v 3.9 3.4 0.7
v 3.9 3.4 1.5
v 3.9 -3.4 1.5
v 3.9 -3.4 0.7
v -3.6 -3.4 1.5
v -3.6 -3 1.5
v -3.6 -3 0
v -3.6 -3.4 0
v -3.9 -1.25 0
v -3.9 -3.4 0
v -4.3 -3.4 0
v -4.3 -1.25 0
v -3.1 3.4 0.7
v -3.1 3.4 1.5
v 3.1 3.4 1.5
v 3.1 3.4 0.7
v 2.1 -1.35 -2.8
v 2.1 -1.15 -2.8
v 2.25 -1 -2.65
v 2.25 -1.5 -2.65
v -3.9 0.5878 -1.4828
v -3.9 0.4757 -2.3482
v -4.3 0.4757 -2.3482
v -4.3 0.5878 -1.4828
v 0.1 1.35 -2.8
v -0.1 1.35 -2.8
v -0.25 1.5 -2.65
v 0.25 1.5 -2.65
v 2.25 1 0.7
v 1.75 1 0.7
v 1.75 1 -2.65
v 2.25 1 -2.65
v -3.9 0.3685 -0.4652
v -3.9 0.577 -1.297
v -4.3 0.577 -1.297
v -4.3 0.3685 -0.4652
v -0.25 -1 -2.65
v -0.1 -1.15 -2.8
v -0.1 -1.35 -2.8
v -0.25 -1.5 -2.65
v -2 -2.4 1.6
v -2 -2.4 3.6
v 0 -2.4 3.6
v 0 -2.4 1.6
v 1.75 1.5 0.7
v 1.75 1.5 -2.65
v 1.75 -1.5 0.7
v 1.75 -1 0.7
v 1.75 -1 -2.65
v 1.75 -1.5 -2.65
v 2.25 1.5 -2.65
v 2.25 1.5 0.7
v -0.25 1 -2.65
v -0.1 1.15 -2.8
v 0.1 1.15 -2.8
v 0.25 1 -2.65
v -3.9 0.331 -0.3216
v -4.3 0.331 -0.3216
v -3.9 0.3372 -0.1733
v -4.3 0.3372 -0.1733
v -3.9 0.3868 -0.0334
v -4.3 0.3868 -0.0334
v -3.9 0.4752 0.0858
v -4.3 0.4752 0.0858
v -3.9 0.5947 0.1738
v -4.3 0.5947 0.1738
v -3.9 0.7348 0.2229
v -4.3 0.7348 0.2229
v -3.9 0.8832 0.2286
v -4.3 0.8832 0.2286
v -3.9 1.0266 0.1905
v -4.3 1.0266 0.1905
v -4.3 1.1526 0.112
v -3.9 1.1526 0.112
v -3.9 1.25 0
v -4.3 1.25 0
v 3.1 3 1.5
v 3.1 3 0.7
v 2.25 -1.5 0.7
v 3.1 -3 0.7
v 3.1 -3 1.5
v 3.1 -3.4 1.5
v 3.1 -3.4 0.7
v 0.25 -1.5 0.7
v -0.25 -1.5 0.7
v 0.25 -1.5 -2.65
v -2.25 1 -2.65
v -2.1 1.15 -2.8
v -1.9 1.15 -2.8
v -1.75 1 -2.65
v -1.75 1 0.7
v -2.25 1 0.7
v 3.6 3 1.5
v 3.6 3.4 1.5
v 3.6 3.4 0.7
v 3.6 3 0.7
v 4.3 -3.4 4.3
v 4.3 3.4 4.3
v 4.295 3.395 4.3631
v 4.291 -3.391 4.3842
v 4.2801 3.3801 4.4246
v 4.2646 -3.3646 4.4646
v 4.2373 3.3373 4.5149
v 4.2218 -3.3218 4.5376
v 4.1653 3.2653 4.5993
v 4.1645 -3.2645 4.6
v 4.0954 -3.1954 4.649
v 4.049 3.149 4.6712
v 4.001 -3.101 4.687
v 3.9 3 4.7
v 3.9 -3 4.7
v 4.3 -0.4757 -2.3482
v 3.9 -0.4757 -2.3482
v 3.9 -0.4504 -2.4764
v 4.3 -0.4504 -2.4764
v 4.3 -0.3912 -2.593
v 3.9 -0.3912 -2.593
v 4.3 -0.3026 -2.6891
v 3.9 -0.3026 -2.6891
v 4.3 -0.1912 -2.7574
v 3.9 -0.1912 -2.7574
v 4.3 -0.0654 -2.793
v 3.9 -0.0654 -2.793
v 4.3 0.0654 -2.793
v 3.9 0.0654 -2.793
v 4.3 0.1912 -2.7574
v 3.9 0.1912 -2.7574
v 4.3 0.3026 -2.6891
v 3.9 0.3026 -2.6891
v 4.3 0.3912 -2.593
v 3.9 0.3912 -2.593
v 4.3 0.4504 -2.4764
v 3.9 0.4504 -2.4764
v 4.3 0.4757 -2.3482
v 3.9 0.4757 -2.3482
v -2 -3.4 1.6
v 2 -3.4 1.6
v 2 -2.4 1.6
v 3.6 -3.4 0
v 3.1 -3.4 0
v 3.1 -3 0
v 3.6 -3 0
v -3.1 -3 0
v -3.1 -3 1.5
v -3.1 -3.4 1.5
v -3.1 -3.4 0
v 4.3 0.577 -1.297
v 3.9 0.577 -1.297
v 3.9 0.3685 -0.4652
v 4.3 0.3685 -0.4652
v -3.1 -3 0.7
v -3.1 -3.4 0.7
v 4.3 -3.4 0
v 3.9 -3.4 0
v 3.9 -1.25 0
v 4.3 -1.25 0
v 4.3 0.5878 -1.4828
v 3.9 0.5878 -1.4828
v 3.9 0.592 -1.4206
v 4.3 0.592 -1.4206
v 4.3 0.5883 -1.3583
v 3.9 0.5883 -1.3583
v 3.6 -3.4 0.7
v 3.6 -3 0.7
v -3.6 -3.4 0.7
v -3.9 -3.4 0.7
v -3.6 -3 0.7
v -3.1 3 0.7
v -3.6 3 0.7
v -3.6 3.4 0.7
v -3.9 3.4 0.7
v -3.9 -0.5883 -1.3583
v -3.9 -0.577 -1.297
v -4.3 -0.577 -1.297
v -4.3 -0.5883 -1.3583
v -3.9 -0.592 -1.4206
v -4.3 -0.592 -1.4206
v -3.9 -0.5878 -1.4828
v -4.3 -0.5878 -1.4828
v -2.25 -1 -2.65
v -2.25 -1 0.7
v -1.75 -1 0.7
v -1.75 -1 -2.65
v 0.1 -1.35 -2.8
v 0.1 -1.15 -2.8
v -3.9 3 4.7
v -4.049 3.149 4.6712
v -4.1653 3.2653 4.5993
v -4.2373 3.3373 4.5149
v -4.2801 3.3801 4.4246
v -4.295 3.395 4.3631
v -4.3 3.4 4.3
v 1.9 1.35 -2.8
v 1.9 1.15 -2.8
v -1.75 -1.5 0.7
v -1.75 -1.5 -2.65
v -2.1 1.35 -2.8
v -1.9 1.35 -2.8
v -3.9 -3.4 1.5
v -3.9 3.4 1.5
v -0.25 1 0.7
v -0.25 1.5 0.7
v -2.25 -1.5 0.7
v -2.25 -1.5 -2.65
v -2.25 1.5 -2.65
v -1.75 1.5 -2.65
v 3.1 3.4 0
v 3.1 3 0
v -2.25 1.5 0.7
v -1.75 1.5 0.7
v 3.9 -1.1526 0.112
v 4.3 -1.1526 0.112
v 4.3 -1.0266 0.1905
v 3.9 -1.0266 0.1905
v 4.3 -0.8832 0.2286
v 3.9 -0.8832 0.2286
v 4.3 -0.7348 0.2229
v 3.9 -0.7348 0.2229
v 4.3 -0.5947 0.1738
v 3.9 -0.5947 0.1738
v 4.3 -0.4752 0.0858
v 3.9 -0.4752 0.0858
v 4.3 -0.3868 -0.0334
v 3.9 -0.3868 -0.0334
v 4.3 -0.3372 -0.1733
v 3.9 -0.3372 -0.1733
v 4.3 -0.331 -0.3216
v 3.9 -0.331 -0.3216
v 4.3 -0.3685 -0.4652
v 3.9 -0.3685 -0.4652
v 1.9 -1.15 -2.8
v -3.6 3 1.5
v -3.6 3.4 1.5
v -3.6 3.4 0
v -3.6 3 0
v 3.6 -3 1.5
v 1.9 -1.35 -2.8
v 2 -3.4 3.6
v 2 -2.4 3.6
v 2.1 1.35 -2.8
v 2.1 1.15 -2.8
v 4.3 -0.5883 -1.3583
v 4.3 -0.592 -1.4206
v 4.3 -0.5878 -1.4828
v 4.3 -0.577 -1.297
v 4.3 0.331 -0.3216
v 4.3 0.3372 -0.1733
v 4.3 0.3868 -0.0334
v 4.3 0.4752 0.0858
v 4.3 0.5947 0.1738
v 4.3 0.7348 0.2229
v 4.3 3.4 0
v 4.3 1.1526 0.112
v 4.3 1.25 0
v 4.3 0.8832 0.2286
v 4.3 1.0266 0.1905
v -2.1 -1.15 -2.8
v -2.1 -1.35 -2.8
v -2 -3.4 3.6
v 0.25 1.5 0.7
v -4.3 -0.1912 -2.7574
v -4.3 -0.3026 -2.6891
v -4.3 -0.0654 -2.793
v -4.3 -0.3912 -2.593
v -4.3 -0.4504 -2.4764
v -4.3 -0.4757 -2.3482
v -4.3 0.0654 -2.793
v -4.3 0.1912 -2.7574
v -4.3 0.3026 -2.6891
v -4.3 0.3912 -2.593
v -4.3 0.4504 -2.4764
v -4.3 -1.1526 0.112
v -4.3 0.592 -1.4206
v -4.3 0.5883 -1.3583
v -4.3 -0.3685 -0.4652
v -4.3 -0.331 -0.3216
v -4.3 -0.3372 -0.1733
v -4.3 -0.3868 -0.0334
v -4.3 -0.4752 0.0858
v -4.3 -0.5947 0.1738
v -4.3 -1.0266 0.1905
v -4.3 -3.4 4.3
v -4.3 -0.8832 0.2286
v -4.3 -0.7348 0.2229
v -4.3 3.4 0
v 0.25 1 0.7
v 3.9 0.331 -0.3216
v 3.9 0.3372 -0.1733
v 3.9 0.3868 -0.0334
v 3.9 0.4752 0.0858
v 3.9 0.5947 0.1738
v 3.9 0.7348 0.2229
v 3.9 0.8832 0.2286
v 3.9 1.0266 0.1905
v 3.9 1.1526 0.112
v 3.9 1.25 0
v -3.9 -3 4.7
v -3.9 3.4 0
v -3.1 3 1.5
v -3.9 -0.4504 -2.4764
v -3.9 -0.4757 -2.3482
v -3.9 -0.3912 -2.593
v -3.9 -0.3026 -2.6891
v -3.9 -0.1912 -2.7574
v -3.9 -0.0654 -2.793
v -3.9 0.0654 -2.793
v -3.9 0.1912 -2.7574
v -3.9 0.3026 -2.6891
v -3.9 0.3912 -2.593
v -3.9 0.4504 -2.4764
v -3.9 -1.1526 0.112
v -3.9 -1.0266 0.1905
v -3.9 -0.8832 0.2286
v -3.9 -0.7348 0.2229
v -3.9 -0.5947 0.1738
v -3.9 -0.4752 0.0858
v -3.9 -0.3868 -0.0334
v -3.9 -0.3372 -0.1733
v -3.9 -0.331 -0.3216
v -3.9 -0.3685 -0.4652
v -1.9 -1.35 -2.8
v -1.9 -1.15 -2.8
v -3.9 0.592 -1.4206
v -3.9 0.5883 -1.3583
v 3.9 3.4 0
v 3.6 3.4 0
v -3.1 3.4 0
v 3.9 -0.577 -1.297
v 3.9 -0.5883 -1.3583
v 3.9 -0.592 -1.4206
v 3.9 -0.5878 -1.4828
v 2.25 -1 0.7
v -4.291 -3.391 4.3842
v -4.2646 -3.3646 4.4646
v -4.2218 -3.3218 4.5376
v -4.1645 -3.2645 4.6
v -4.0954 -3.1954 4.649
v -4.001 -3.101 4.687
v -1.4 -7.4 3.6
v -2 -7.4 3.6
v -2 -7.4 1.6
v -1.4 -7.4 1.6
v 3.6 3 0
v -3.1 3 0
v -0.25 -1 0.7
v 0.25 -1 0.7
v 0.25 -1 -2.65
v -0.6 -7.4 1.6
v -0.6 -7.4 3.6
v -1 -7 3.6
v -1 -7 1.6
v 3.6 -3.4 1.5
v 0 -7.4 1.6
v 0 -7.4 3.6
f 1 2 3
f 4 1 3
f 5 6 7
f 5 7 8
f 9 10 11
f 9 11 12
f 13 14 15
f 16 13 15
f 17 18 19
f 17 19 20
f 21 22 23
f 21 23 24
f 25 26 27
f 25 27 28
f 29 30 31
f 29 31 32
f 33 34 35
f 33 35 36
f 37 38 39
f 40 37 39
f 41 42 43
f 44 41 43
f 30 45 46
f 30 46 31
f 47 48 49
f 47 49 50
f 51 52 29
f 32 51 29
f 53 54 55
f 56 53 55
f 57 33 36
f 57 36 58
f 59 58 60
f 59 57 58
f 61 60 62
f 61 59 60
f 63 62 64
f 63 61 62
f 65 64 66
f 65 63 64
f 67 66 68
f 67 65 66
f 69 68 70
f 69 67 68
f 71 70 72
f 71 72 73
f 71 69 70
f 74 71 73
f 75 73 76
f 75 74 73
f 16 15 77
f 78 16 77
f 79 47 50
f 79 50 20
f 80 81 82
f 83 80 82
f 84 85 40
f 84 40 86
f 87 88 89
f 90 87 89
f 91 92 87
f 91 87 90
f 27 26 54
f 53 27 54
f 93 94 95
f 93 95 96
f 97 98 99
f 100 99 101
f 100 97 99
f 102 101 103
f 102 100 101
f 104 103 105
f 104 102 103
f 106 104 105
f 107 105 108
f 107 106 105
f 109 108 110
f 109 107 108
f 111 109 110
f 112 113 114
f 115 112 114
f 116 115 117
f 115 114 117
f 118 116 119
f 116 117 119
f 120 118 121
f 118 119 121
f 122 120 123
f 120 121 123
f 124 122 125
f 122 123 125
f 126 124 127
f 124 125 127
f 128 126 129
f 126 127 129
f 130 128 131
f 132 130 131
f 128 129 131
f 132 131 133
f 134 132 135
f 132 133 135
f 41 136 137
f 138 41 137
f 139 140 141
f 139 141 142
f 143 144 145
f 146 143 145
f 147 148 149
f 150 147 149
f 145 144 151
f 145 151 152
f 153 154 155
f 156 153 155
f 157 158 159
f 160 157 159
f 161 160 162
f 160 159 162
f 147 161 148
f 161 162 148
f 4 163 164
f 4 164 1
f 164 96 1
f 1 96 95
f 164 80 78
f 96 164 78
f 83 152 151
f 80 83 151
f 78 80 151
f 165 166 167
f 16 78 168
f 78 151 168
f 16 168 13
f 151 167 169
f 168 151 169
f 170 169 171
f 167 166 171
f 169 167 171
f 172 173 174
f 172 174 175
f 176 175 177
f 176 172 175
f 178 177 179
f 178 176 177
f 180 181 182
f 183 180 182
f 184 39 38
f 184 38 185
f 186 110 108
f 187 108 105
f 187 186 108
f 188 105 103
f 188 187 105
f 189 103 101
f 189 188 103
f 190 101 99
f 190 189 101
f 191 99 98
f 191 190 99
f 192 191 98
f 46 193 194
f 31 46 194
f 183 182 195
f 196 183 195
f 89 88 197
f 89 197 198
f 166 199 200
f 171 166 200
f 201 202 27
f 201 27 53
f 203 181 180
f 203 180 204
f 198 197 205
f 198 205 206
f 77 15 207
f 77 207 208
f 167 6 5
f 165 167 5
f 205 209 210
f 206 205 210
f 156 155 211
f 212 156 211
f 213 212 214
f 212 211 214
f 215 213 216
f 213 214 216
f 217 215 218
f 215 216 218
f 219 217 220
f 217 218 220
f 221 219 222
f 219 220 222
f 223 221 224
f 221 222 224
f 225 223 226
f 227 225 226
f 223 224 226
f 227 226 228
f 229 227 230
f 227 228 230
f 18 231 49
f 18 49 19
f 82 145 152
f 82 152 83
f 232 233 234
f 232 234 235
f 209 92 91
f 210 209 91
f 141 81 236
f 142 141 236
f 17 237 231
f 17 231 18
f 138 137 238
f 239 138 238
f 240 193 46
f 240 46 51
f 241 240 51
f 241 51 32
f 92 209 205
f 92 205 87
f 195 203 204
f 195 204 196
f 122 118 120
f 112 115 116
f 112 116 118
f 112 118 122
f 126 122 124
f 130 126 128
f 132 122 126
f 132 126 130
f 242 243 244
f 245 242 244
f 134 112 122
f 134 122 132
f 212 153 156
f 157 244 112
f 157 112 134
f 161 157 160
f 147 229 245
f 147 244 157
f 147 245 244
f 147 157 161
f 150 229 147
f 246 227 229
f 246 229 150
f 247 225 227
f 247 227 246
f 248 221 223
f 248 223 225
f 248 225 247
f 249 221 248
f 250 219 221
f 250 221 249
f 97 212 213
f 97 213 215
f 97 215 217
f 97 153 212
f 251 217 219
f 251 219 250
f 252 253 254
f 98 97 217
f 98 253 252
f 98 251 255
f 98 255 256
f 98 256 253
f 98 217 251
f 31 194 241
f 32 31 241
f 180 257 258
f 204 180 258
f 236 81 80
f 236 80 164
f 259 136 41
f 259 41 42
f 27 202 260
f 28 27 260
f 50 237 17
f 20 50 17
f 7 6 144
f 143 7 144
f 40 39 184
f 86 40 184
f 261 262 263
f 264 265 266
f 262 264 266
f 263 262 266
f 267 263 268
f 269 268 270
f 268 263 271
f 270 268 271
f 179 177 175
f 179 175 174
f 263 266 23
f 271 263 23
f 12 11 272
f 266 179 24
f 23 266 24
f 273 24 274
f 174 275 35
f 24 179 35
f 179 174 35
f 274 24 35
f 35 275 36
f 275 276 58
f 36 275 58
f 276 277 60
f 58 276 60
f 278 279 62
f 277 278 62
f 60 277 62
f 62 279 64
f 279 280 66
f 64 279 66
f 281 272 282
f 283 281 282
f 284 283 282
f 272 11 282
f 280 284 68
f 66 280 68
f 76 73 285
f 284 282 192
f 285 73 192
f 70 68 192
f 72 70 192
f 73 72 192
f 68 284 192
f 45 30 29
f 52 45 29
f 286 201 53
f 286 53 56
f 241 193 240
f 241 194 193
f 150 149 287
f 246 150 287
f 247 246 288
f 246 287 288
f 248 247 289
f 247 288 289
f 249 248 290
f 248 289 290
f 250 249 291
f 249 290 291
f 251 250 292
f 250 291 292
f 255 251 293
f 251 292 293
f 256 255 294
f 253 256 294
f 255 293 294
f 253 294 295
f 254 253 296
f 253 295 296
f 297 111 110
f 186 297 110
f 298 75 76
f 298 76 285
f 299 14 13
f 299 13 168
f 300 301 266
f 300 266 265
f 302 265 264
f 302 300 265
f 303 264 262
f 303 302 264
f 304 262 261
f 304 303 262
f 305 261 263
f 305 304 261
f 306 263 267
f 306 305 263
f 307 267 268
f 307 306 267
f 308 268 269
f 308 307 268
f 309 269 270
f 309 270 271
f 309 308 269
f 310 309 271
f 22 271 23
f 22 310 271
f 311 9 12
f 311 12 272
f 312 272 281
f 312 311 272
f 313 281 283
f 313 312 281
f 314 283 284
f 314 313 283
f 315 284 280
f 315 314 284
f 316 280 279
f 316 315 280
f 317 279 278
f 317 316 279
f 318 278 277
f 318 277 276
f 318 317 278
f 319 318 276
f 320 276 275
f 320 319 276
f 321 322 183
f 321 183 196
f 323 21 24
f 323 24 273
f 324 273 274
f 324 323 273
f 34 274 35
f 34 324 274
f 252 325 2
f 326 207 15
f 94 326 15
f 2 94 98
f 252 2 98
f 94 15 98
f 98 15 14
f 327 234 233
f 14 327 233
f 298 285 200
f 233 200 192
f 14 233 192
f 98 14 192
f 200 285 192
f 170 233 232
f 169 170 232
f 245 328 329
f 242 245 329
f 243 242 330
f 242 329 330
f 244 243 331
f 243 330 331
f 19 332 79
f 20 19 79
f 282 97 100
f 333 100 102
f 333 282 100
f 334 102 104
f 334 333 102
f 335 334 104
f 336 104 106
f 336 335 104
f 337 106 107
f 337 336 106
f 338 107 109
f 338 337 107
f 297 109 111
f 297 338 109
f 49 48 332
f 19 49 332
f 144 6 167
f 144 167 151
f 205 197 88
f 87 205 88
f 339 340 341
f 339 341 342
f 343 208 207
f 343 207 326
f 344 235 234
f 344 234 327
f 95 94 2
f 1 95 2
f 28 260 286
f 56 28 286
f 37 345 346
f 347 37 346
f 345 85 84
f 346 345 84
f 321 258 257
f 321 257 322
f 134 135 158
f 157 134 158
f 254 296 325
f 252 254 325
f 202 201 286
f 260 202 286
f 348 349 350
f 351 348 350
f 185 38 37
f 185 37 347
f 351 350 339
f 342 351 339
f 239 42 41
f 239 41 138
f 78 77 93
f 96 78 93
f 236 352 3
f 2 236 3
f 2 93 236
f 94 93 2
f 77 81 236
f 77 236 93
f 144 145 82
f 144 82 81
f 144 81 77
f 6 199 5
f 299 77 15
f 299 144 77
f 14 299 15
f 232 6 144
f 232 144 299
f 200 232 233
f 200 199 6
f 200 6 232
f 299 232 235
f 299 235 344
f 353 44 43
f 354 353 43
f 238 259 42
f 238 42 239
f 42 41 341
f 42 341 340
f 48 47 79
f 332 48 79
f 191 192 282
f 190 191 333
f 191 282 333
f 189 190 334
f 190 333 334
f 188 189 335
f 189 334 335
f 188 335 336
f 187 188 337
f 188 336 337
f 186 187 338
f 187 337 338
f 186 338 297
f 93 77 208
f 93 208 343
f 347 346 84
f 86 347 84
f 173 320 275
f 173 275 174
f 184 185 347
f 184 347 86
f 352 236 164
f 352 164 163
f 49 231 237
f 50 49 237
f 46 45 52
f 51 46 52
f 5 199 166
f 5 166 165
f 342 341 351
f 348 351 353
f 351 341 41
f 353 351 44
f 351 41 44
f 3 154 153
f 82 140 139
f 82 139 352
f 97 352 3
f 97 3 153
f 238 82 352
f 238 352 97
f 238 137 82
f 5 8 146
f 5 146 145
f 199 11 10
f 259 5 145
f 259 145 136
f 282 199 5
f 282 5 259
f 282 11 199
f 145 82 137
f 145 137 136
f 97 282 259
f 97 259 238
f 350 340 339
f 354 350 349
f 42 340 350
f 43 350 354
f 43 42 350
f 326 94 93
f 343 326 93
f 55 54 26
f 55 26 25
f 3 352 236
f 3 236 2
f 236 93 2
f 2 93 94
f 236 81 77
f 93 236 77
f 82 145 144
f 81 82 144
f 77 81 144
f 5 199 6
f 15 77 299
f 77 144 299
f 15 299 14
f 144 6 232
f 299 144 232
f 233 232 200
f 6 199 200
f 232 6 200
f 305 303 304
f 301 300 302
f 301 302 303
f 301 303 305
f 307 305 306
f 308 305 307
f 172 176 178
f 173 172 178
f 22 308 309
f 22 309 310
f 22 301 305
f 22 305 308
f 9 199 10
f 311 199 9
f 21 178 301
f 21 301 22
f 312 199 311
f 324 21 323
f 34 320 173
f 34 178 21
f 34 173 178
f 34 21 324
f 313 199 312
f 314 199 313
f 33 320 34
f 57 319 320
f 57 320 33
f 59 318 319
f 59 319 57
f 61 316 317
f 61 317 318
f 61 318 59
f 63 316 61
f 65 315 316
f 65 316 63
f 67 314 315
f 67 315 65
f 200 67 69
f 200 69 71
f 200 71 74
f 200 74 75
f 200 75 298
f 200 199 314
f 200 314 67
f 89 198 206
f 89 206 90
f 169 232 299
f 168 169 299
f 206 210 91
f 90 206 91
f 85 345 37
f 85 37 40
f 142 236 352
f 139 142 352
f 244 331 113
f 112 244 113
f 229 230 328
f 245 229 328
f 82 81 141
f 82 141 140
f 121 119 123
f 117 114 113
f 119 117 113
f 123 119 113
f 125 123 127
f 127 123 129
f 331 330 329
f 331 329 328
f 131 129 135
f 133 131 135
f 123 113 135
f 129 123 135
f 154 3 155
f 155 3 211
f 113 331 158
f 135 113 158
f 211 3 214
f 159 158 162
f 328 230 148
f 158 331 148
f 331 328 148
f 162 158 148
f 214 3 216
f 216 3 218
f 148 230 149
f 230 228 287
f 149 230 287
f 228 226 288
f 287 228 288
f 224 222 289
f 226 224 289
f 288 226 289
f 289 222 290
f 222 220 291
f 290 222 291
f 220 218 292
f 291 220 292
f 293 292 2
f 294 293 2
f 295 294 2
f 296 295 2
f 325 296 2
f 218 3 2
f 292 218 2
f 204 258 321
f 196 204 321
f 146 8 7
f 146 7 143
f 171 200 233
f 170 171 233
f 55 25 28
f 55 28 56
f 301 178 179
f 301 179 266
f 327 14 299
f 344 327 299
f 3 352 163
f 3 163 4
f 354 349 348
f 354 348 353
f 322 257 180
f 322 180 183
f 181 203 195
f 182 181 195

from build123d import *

# Parameters (mm, degrees)
F1_START   = 3.9
F1_DEPTH   = 0.4
F3_W       = 6.8
F3_H       = 3.2
F4_DEPTH   = 8
F5_W       = 0.5
F5_H       = 0.4
F6_DEPTH   = 1.5
F7_DEPTH   = 0.8
F8_R       = 0.4
F9_W       = 4
F9_H       = 2
F10_DEPTH  = 1
F11_W      = 2
F11_H      = 2
F12_DEPTH  = 5
F14_DEPTH  = 25
F15_W      = 0.5
F15_H      = 0.5
F16_DEPTH  = 3.5
F17_SIZE   = 0.15
F17_2_SIZE = 0.15
F17_3_SIZE = 0.15
F17_4_SIZE = 0.15
F17_5_SIZE = 0.15
F17_6_SIZE = 0.15


with BuildPart() as f1:
    # F0 (on Right) → F1 (new body)
    with BuildSketch(Plane.YZ.offset(F1_START)):
        with BuildLine():
            Line((-3.4, 4.7), (-3.4, 0))
            Line((-3.4, 0), (-1.25, 0))
            ThreePointArc((-1.25, 0), (-0.5947362498, 0.1738282345), (-0.3685141855, -0.4652417265))
            Line((-0.3685141855, -0.4652417265), (-0.5769748612, -1.297007943))
            ThreePointArc((-0.5769748612, -1.297007943), (-0.5911237195, -1.3893977424), (-0.5878301918, -1.4828066172))
            Line((-0.5878301918, -1.4828066172), (-0.4757099377, -2.3481589742))
            ThreePointArc((-0.4757099377, -2.3481589742), (0, -2.7974626246), (0.4757099377, -2.3481589742))
            Line((0.4757099377, -2.3481589742), (0.5878301918, -1.4828066172))
            ThreePointArc((0.5878301918, -1.4828066172), (0.5911237195, -1.3893977424), (0.5769748612, -1.297007943))
            Line((0.5769748612, -1.297007943), (0.3685141855, -0.4652417265))
            ThreePointArc((0.3685141855, -0.4652417265), (0.5947362498, 0.1738282345), (1.25, 0))
            Line((1.25, 0), (3.4, 0))
            Line((3.4, 0), (3.4, 4.7))
            Line((3.4, 4.7), (-3.4, 4.7))
        make_face()
    extrude(amount=F1_DEPTH)


with BuildPart() as f2_1:
    # F2: instance of F1
    add(f1.part.mirror(Plane.YZ))


with BuildPart() as f1_1:
    add(f1.part)

    add(f2_1.part)  # F4 merges F2_1
    # F3 (on face) → F4 (join)
    with BuildSketch(Plane.YZ.offset(-3.9)):
        with Locations((0, 3.1)):
            Rectangle(F3_W, F3_H)
    extrude(amount=F4_DEPTH)

    # F5 (on face) → F6 (join)
    with BuildSketch(Plane(origin=(0, 0, 1.5), x_dir=(1, 0, 0), z_dir=(0, 0, -1))):
        with Locations((3.35, 3.2)):
            Rectangle(F5_W, F5_H)
        with Locations((3.35, -3.2)):
            Rectangle(F5_W, F5_H)
        with Locations((-3.35, 3.2)):
            Rectangle(F5_W, F5_H)
        with Locations((-3.35, -3.2)):
            Rectangle(F5_W, F5_H)
    extrude(amount=F6_DEPTH)


with BuildPart() as f7:
    # F7 (new): a face of the model
    f7_faces = [f1_1.part.faces().sort_by_distance(p)[0] for p in [
        (0, 0, 1.5),
    ]]
    extrude(f7_faces, amount=F7_DEPTH)


with BuildPart() as f1_2:
    add(f1_1.part)

    # F8
    f8_edges = [f1_2.edges().sort_by_distance(p)[0] for p in [
        (0, 3.4, 4.7),
        (-4.3, 0, 4.7),
        (0, -3.4, 4.7),
        (4.3, 0, 4.7),
    ]]
    fillet(f8_edges, radius=F8_R)

    # F9 (on face) → F10 (cut)
    with BuildSketch(Plane.XZ.offset(3.4)):
        with Locations((0, 2.6)):
            Rectangle(F9_W, F9_H)
    extrude(amount=-F10_DEPTH, mode=Mode.SUBTRACT)


with BuildPart() as f12:
    # F11 (on face) → F12 (new body)
    with BuildSketch(Plane.XZ.offset(2.4)):
        with Locations((-1, 2.6)):
            Rectangle(F11_W, F11_H)
    extrude(amount=F12_DEPTH)

    # F13 (on face) → F14 (cut)
    with BuildSketch(Plane.XY.offset(3.6)):
        Polygon((-1, -7), (-1.4, -7.4), (-0.6, -7.4), align=None)
    extrude(amount=-F14_DEPTH, mode=Mode.SUBTRACT)


with BuildPart() as f16:
    # F15 (on face) → F16 (new body)
    with BuildSketch(Plane(origin=(0, 0, 0.7), x_dir=(1, 0, 0), z_dir=(0, 0, -1))):
        with Locations((-2, 1.25)):
            Rectangle(F15_W, F15_H)
    extrude(amount=F16_DEPTH)

    # F17
    f17_edges = [f16.edges().sort_by_distance(p)[0] for p in [
        (-1.75, -1.25, -2.8),
        (-2, -1.5, -2.8),
        (-2.25, -1.25, -2.8),
        (-2, -1, -2.8),
    ]]
    chamfer(f17_edges, length=F17_SIZE)


with BuildPart() as f16b:
    # F15 (on face) → F16, piece 2 (new body)
    with BuildSketch(Plane(origin=(0, 0, 0.7), x_dir=(1, 0, 0), z_dir=(0, 0, -1))):
        with Locations((0, 1.25)):
            Rectangle(F15_W, F15_H)
    extrude(amount=F16_DEPTH)

    # F17#2
    f17_2_edges = [f16b.edges().sort_by_distance(p)[0] for p in [
        (0, -1.5, -2.8),
        (-0.25, -1.25, -2.8),
        (0, -1, -2.8),
        (0.25, -1.25, -2.8),
    ]]
    chamfer(f17_2_edges, length=F17_2_SIZE)


with BuildPart() as f16c:
    # F15 (on face) → F16, piece 3 (new body)
    with BuildSketch(Plane(origin=(0, 0, 0.7), x_dir=(1, 0, 0), z_dir=(0, 0, -1))):
        with Locations((2, -1.25)):
            Rectangle(F15_W, F15_H)
    extrude(amount=F16_DEPTH)

    # F17#4
    f17_4_edges = [f16c.edges().sort_by_distance(p)[0] for p in [
        (2, 1.5, -2.8),
        (2.25, 1.25, -2.8),
        (2, 1, -2.8),
        (1.75, 1.25, -2.8),
    ]]
    chamfer(f17_4_edges, length=F17_4_SIZE)


with BuildPart() as f16d:
    # F15 (on face) → F16, piece 4 (new body)
    with BuildSketch(Plane(origin=(0, 0, 0.7), x_dir=(1, 0, 0), z_dir=(0, 0, -1))):
        with Locations((0, -1.25)):
            Rectangle(F15_W, F15_H)
    extrude(amount=F16_DEPTH)

    # F17#5
    f17_5_edges = [f16d.edges().sort_by_distance(p)[0] for p in [
        (0, 1, -2.8),
        (-0.25, 1.25, -2.8),
        (0, 1.5, -2.8),
        (0.25, 1.25, -2.8),
    ]]
    chamfer(f17_5_edges, length=F17_5_SIZE)


with BuildPart() as f16e:
    # F15 (on face) → F16, piece 5 (new body)
    with BuildSketch(Plane(origin=(0, 0, 0.7), x_dir=(1, 0, 0), z_dir=(0, 0, -1))):
        with Locations((-2, -1.25)):
            Rectangle(F15_W, F15_H)
    extrude(amount=F16_DEPTH)

    # F17#6
    f17_6_edges = [f16e.edges().sort_by_distance(p)[0] for p in [
        (-2.25, 1.25, -2.8),
        (-2, 1.5, -2.8),
        (-1.75, 1.25, -2.8),
        (-2, 1, -2.8),
    ]]
    chamfer(f17_6_edges, length=F17_6_SIZE)


with BuildPart() as f16f:
    # F15 (on face) → F16, piece 6 (new body)
    with BuildSketch(Plane(origin=(0, 0, 0.7), x_dir=(1, 0, 0), z_dir=(0, 0, -1))):
        with Locations((2, 1.25)):
            Rectangle(F15_W, F15_H)
    extrude(amount=F16_DEPTH)

    # F17#3
    f17_3_edges = [f16f.edges().sort_by_distance(p)[0] for p in [
        (2, -1.5, -2.8),
        (1.75, -1.25, -2.8),
        (2, -1, -2.8),
        (2.25, -1.25, -2.8),
    ]]
    chamfer(f17_3_edges, length=F17_3_SIZE)


solid = Compound([f7.part, f1_2.part, f12.part, f16.part, f16b.part, f16c.part, f16d.part, f16e.part, f16f.part])
